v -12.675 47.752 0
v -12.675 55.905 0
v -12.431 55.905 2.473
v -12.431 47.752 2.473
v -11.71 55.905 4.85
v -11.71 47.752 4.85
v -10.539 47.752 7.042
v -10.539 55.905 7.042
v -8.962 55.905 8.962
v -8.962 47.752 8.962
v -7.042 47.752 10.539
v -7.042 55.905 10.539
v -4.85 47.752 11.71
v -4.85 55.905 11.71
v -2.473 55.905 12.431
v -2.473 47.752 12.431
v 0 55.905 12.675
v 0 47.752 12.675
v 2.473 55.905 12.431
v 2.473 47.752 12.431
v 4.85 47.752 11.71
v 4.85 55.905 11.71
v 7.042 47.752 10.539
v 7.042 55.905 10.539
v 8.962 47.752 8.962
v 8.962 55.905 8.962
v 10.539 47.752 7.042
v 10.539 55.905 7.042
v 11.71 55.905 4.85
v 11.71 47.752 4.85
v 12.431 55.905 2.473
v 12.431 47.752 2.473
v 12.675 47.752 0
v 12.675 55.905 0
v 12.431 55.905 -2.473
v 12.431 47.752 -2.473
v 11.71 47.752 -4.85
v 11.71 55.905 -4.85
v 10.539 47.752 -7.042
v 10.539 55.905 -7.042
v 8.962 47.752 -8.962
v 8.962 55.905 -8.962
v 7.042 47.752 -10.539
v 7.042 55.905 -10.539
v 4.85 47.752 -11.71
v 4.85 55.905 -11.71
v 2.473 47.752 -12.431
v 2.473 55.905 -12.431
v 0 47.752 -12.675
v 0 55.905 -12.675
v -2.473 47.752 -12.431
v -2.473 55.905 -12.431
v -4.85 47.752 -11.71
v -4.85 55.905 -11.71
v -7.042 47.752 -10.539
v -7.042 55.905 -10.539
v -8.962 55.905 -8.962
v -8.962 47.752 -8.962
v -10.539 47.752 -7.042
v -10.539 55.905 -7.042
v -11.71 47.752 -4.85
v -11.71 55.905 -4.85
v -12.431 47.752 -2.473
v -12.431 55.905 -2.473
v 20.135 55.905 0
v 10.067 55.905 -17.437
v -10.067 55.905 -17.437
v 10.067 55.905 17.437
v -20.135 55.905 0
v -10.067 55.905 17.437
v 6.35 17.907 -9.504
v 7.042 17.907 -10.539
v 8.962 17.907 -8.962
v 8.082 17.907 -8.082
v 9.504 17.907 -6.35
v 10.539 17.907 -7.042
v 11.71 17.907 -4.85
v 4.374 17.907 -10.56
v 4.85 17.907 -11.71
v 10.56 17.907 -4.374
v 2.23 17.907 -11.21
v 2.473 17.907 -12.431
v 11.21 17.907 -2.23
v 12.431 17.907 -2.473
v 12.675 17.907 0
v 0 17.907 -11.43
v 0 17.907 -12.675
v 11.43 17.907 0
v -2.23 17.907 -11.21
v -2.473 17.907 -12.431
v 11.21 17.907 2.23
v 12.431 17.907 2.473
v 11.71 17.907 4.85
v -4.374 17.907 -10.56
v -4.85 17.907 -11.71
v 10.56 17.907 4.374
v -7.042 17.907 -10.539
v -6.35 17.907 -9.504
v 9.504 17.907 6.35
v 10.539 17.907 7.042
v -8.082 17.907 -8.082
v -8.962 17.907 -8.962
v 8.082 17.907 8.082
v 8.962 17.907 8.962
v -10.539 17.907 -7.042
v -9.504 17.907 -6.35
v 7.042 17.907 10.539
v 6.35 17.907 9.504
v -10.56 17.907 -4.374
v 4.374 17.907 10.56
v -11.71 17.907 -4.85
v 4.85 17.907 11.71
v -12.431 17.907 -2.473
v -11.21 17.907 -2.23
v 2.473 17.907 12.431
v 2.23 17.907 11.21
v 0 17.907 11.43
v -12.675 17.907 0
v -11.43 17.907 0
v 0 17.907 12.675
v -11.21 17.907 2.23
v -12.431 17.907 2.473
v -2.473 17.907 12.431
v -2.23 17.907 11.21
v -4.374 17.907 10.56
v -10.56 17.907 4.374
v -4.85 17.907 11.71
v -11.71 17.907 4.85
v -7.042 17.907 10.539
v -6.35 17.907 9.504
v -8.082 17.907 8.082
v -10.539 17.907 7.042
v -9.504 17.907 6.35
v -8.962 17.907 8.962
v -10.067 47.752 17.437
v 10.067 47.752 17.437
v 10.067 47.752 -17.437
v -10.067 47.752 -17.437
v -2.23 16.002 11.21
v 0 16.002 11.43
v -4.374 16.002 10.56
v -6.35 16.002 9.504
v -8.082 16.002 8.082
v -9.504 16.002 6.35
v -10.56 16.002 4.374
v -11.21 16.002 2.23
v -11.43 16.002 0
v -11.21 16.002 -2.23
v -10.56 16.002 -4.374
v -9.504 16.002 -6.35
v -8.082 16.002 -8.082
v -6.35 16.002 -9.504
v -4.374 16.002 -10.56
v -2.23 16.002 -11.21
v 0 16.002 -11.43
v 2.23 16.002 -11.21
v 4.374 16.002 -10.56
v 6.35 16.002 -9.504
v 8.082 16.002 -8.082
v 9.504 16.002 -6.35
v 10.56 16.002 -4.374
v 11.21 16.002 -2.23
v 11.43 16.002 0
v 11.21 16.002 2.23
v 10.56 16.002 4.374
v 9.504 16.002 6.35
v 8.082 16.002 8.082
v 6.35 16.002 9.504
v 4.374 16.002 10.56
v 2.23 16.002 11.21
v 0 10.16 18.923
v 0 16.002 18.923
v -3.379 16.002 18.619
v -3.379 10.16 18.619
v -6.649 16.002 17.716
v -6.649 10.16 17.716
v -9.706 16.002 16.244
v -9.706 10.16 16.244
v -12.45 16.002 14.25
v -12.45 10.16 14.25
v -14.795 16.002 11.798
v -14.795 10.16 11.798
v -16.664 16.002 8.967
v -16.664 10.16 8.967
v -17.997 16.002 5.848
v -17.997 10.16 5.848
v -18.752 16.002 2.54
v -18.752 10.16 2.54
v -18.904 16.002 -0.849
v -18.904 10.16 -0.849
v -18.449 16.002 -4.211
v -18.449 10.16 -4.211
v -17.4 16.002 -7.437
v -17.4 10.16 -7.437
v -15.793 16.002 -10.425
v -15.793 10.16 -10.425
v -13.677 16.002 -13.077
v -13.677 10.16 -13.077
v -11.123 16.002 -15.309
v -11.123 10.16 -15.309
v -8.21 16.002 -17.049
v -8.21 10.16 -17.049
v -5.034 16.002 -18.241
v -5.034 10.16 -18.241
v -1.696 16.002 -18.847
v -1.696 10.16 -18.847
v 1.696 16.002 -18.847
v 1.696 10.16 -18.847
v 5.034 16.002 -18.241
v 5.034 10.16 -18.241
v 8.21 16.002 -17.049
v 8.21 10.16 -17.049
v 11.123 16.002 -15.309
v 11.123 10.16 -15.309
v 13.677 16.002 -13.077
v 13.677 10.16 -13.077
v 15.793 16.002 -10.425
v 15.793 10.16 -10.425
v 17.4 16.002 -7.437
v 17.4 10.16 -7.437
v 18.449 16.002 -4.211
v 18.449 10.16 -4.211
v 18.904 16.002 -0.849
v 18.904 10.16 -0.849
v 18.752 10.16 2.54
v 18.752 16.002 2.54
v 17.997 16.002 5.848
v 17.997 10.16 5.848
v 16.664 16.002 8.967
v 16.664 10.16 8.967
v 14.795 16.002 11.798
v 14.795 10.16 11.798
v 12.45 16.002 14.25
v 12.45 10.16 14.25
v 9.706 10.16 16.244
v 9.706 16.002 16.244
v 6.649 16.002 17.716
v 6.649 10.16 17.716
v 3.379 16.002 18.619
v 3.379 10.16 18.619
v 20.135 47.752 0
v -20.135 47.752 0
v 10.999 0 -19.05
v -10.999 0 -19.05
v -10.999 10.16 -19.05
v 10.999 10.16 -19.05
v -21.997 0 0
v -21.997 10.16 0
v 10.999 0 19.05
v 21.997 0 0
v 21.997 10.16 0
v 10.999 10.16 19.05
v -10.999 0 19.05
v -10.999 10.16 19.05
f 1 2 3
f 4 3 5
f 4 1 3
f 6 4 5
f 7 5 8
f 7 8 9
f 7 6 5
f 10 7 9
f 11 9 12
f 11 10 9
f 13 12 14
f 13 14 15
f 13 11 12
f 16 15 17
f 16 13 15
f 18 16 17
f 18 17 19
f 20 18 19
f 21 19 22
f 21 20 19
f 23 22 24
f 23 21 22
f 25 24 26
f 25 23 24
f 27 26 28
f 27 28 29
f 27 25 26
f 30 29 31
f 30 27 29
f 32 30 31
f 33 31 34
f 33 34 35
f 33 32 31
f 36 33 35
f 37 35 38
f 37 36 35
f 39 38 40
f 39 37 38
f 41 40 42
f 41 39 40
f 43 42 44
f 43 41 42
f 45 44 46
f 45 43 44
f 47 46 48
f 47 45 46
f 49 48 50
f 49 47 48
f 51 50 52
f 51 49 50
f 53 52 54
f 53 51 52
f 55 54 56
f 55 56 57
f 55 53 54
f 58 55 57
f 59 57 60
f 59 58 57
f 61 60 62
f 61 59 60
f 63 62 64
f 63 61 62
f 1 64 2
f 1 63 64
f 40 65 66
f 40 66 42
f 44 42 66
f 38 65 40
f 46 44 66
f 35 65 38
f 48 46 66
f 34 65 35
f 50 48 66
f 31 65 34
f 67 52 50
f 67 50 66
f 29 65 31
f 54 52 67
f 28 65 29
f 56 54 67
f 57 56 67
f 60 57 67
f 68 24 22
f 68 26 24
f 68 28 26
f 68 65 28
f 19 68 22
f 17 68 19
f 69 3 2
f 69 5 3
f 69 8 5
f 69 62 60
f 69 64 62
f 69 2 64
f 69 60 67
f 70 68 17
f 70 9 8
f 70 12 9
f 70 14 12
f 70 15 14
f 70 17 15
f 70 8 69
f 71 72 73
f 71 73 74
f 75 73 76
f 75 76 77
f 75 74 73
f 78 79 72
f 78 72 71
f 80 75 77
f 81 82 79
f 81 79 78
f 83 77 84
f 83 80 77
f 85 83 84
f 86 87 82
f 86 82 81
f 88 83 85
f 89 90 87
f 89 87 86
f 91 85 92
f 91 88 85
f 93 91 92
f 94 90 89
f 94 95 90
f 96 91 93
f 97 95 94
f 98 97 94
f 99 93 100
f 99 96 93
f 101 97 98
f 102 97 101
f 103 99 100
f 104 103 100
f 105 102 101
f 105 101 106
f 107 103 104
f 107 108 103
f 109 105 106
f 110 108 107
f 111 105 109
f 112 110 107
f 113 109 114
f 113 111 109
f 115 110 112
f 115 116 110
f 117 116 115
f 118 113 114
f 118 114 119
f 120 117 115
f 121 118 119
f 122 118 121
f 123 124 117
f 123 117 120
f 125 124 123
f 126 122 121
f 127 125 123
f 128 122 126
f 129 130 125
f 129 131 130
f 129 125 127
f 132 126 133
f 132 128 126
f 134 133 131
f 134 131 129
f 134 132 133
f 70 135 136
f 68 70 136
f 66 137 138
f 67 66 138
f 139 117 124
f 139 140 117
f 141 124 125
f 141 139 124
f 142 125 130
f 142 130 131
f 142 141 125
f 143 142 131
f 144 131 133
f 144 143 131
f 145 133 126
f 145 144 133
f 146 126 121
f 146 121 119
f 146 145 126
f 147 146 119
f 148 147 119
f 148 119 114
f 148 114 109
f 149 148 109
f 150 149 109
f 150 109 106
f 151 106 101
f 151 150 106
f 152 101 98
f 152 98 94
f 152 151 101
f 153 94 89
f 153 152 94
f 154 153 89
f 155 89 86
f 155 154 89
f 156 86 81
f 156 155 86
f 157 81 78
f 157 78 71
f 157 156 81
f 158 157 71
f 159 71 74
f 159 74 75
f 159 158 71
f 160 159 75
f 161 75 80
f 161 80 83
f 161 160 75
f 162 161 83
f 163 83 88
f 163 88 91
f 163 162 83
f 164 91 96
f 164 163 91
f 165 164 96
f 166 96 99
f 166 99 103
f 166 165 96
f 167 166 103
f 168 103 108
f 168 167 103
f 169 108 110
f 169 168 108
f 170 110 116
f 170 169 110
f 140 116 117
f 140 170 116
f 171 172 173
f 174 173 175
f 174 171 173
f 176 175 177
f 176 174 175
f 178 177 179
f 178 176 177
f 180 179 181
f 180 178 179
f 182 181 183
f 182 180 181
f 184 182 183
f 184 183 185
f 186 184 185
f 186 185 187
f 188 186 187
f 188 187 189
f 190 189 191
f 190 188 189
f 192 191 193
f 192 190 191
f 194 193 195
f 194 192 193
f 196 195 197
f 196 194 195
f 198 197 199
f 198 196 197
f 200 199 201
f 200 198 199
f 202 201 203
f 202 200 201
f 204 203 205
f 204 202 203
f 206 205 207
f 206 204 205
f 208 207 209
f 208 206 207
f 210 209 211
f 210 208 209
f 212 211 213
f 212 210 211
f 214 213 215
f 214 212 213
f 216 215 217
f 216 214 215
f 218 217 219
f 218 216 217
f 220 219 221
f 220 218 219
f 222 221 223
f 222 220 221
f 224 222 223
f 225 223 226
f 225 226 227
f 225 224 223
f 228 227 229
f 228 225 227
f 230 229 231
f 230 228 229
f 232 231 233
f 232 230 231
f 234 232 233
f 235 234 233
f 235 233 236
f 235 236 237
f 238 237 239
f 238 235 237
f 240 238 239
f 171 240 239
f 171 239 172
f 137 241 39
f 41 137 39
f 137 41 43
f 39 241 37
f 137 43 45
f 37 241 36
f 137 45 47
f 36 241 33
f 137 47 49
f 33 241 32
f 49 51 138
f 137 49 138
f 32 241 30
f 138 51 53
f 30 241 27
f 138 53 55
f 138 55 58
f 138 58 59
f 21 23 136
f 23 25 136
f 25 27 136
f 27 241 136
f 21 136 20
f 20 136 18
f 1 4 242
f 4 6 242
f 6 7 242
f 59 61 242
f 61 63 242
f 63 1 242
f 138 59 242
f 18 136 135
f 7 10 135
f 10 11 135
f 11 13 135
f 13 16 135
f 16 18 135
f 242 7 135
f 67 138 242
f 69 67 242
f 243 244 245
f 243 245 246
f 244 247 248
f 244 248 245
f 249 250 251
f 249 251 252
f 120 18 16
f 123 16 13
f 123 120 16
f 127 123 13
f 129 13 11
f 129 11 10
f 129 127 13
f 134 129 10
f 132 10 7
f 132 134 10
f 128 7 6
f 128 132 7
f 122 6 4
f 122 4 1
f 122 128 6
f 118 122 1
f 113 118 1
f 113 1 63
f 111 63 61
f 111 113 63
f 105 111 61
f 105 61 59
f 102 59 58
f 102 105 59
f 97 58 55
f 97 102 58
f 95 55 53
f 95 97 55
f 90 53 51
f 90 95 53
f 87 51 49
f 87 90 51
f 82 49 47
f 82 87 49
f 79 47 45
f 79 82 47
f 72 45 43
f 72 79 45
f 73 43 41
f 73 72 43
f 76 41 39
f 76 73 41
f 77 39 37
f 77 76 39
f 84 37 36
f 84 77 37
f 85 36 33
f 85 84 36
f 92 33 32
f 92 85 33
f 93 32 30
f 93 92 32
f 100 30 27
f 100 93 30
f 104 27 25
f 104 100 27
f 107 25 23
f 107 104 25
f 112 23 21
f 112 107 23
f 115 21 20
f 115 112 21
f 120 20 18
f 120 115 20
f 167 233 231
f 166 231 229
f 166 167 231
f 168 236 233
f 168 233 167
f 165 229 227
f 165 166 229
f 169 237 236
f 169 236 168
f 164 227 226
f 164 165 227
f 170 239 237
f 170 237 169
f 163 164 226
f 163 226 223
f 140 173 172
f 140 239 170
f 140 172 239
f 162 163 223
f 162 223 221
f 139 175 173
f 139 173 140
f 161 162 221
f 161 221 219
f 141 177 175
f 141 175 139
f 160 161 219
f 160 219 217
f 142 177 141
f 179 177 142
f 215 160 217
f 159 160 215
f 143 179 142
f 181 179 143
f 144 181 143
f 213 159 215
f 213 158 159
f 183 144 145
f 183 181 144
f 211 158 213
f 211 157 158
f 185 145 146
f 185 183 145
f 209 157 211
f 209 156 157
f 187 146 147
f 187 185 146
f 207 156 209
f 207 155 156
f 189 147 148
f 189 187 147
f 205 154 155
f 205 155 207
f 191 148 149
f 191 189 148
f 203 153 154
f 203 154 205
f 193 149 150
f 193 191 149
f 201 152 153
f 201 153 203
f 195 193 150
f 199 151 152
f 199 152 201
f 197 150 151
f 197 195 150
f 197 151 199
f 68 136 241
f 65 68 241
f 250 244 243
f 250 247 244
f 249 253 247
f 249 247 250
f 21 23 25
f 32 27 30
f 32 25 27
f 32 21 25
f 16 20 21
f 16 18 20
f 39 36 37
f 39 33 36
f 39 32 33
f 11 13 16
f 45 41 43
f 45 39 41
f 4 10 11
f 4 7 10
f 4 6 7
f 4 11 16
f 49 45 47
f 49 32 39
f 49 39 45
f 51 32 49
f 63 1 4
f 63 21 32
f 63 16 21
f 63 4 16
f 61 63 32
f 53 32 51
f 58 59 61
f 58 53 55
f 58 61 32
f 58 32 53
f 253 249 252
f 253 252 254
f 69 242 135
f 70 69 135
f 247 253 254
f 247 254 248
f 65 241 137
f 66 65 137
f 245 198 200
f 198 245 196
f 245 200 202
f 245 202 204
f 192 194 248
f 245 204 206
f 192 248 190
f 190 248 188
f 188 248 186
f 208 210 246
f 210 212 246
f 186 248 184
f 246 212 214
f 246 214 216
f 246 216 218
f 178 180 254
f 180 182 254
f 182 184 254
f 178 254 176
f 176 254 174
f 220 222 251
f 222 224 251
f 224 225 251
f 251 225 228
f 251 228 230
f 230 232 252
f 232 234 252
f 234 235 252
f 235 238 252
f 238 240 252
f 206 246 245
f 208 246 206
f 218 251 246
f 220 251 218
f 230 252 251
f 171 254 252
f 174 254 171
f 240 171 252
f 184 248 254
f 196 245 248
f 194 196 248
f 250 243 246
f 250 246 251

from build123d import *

# Parameters (mm, degrees)
F2_R     = 18.923
F3_DEPTH = 10.16
F4_R     = 12.6746
F5_DEPTH = 8.1534


with BuildPart() as f1:
    # F0 (on Right) → F1 (revolve)
    with BuildSketch(Plane.YZ):
        Polygon((0, 18.923), (0, 0), (47.752, 0), (47.752, 12.6746), (17.907, 12.6746), (17.907, 11.43), (16.002, 11.43), (16.002, 18.923), align=None)
    revolve(axis=Axis((0, 23.876, 0), (0, -1, 0)))

    # F2 (on face) → F3 (join)
    with BuildSketch(Plane.XZ):
        Polygon((-10.998523, -19.05), (10.998523, -19.05), (21.997045, 0), (10.998523, 19.05), (-10.998523, 19.05), (-21.997045, 0), align=None)
        Circle(F2_R, mode=Mode.SUBTRACT)
    extrude(amount=-F3_DEPTH)


with BuildPart() as f5:
    # F4 (on face) → F5 (new body)
    with BuildSketch(Plane(origin=(0, 47.752, 0), x_dir=(-1, 0, 0), z_dir=(0, 1, 0))):
        Polygon((10.067314, 17.4371), (-10.067314, 17.4371), (-20.134629, 0), (-10.067314, -17.4371), (10.067314, -17.4371), (20.134629, 0), align=None)
        Circle(F4_R, mode=Mode.SUBTRACT)
    extrude(amount=F5_DEPTH)


solid = Compound([f1.part, f5.part])
